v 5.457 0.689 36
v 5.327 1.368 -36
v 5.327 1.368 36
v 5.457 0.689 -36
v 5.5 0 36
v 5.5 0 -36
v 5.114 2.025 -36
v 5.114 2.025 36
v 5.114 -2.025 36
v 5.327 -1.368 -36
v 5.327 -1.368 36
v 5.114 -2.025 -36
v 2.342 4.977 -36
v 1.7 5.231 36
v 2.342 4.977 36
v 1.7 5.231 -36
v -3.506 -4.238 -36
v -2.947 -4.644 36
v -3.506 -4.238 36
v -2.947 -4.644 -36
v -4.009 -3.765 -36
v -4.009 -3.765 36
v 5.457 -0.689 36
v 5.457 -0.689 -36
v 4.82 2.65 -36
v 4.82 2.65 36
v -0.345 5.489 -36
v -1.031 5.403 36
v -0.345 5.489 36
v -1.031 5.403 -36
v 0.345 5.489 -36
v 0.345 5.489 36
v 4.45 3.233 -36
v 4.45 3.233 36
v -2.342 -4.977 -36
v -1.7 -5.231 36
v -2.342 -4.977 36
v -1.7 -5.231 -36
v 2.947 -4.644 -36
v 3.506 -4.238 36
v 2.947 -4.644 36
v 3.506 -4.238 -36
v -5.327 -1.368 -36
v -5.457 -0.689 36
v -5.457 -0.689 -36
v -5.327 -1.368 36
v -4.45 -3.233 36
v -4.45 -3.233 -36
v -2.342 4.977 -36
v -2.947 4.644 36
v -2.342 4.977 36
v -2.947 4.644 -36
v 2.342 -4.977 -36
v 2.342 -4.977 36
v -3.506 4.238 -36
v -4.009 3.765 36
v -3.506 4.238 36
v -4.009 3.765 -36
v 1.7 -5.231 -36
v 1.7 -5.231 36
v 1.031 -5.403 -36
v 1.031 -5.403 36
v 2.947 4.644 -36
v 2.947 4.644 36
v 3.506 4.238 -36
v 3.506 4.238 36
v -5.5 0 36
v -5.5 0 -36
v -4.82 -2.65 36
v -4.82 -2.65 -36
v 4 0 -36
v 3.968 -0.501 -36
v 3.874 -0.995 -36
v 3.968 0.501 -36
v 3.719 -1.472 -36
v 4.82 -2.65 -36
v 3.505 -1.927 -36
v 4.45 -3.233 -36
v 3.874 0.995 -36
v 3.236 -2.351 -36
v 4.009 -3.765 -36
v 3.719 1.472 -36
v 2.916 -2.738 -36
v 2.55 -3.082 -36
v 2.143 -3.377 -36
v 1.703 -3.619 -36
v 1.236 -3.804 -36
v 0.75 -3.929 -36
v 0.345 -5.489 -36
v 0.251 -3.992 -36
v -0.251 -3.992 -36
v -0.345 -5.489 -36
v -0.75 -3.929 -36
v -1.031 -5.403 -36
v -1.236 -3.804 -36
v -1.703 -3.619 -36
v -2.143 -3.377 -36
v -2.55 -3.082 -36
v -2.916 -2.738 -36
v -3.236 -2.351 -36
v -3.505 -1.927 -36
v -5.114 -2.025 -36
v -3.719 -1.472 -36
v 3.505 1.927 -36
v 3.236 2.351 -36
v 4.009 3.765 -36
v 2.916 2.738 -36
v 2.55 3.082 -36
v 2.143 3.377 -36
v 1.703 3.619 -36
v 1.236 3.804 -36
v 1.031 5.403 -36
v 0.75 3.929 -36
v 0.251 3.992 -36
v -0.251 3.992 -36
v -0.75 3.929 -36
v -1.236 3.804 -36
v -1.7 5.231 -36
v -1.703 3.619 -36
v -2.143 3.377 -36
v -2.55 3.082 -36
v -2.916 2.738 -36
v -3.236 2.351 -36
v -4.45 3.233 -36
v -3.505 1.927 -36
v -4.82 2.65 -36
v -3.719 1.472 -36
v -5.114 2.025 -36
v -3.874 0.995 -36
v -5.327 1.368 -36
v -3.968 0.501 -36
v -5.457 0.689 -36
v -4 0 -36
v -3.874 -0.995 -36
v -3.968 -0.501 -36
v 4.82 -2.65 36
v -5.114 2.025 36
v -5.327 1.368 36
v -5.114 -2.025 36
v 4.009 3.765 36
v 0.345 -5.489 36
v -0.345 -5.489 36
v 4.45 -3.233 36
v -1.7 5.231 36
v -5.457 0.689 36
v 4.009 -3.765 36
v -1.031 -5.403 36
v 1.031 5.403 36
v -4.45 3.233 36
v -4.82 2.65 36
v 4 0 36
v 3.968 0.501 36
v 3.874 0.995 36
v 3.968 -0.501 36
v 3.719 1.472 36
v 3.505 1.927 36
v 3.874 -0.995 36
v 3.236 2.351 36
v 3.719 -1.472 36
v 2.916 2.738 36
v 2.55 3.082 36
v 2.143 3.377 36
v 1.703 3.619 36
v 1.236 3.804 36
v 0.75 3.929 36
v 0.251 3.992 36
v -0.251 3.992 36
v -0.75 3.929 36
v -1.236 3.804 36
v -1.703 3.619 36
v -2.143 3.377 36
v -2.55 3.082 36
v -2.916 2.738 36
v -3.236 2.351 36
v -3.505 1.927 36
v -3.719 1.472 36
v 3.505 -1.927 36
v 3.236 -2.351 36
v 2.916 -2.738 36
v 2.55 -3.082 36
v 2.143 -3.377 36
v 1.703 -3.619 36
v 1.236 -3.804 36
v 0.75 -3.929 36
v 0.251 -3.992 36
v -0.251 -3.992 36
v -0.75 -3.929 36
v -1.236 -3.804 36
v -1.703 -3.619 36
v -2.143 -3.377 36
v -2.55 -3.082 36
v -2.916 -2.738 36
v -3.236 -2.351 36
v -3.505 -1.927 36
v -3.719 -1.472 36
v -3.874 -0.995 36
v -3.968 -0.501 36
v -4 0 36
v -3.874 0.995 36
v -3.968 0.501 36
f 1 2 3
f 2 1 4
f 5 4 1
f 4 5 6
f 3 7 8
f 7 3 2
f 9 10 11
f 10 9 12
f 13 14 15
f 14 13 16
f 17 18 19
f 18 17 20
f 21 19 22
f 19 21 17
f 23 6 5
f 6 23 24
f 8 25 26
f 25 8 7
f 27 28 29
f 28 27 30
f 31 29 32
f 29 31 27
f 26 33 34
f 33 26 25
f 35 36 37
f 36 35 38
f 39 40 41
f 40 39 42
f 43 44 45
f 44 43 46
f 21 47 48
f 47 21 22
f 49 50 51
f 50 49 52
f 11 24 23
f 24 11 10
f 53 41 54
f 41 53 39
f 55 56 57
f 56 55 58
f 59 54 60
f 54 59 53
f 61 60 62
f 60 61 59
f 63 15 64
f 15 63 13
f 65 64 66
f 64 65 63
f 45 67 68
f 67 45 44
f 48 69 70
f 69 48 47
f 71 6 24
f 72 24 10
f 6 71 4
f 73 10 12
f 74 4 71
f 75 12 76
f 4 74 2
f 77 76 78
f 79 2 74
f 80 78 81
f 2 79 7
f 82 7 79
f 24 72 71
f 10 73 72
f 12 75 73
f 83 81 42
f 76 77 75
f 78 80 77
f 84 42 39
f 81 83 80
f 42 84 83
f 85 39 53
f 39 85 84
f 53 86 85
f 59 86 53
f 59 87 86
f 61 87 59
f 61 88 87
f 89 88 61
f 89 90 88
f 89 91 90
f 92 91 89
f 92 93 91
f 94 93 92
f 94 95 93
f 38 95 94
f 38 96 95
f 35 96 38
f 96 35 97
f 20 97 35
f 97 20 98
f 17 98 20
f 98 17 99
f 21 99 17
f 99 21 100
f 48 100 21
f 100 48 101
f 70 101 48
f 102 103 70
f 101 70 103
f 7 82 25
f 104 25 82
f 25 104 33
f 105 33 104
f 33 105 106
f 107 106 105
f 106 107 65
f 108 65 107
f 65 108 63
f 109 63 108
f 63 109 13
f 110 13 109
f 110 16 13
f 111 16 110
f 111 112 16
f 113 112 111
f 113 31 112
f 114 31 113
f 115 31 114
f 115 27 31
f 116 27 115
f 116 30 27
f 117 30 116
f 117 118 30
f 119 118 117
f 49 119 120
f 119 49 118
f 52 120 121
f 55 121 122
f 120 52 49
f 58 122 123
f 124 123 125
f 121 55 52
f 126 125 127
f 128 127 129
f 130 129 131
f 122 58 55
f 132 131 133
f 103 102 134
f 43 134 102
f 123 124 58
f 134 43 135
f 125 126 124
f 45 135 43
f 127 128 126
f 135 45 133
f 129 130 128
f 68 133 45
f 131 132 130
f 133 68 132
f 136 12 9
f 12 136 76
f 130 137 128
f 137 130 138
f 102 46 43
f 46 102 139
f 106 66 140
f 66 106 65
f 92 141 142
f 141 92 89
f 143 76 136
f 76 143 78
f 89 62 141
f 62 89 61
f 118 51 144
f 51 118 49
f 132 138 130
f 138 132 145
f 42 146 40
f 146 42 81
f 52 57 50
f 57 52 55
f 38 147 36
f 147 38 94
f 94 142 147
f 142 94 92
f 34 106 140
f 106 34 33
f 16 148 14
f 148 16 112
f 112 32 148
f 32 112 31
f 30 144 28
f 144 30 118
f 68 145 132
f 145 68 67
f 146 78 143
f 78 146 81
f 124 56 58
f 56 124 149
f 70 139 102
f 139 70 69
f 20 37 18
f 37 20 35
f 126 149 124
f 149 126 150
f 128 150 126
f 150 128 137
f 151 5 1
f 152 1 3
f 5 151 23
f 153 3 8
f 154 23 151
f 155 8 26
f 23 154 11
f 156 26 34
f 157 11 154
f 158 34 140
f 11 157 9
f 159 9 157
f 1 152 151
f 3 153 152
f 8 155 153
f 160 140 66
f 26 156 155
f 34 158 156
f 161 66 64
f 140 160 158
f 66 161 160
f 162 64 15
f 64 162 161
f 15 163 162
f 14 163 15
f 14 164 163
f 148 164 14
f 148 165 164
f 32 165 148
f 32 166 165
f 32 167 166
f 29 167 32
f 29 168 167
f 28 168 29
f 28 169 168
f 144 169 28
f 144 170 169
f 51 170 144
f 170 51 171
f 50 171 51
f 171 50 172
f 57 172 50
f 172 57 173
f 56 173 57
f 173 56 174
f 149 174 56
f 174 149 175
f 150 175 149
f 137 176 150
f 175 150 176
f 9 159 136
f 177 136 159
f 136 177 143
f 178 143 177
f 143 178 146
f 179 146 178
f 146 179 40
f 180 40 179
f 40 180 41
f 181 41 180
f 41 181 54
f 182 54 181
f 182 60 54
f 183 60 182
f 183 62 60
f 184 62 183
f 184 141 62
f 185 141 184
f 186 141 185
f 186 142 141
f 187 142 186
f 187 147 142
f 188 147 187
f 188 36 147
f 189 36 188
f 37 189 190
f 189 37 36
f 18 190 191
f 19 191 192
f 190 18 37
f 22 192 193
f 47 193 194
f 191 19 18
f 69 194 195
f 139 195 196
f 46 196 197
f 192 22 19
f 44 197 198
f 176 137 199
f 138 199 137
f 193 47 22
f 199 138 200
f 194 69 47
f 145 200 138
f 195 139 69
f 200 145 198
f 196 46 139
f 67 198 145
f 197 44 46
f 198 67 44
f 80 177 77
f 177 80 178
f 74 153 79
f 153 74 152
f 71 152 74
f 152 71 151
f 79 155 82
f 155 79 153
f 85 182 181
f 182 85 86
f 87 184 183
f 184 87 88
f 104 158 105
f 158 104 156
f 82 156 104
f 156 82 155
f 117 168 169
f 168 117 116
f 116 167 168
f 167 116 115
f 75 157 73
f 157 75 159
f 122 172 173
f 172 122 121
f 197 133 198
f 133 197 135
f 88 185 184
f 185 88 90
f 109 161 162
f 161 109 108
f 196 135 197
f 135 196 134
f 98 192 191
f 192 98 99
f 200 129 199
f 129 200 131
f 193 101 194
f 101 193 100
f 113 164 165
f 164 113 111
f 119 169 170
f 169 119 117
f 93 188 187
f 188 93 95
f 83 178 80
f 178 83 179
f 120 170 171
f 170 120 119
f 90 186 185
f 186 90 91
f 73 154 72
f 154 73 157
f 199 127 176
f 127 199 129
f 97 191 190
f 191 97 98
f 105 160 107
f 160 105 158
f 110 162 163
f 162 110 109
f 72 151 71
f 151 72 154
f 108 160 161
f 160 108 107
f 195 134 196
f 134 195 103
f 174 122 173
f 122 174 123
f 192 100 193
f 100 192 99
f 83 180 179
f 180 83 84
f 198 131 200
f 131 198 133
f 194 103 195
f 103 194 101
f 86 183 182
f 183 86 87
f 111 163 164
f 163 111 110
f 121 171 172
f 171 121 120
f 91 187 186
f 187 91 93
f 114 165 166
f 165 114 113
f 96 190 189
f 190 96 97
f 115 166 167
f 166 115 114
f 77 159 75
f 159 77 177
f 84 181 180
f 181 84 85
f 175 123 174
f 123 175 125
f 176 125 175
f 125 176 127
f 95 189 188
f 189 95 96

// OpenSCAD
$fn = 50;


difference() {
	union() {
		translate(v = [0, 0, -36.0000000000]) {
			cylinder(h = 72, r = 5.5000000000);
		}
	}
	union() {
		translate(v = [0, 0, -100.0000000000]) {
			cylinder(h = 200, r = 4.0000000000);
		}
	}
}
